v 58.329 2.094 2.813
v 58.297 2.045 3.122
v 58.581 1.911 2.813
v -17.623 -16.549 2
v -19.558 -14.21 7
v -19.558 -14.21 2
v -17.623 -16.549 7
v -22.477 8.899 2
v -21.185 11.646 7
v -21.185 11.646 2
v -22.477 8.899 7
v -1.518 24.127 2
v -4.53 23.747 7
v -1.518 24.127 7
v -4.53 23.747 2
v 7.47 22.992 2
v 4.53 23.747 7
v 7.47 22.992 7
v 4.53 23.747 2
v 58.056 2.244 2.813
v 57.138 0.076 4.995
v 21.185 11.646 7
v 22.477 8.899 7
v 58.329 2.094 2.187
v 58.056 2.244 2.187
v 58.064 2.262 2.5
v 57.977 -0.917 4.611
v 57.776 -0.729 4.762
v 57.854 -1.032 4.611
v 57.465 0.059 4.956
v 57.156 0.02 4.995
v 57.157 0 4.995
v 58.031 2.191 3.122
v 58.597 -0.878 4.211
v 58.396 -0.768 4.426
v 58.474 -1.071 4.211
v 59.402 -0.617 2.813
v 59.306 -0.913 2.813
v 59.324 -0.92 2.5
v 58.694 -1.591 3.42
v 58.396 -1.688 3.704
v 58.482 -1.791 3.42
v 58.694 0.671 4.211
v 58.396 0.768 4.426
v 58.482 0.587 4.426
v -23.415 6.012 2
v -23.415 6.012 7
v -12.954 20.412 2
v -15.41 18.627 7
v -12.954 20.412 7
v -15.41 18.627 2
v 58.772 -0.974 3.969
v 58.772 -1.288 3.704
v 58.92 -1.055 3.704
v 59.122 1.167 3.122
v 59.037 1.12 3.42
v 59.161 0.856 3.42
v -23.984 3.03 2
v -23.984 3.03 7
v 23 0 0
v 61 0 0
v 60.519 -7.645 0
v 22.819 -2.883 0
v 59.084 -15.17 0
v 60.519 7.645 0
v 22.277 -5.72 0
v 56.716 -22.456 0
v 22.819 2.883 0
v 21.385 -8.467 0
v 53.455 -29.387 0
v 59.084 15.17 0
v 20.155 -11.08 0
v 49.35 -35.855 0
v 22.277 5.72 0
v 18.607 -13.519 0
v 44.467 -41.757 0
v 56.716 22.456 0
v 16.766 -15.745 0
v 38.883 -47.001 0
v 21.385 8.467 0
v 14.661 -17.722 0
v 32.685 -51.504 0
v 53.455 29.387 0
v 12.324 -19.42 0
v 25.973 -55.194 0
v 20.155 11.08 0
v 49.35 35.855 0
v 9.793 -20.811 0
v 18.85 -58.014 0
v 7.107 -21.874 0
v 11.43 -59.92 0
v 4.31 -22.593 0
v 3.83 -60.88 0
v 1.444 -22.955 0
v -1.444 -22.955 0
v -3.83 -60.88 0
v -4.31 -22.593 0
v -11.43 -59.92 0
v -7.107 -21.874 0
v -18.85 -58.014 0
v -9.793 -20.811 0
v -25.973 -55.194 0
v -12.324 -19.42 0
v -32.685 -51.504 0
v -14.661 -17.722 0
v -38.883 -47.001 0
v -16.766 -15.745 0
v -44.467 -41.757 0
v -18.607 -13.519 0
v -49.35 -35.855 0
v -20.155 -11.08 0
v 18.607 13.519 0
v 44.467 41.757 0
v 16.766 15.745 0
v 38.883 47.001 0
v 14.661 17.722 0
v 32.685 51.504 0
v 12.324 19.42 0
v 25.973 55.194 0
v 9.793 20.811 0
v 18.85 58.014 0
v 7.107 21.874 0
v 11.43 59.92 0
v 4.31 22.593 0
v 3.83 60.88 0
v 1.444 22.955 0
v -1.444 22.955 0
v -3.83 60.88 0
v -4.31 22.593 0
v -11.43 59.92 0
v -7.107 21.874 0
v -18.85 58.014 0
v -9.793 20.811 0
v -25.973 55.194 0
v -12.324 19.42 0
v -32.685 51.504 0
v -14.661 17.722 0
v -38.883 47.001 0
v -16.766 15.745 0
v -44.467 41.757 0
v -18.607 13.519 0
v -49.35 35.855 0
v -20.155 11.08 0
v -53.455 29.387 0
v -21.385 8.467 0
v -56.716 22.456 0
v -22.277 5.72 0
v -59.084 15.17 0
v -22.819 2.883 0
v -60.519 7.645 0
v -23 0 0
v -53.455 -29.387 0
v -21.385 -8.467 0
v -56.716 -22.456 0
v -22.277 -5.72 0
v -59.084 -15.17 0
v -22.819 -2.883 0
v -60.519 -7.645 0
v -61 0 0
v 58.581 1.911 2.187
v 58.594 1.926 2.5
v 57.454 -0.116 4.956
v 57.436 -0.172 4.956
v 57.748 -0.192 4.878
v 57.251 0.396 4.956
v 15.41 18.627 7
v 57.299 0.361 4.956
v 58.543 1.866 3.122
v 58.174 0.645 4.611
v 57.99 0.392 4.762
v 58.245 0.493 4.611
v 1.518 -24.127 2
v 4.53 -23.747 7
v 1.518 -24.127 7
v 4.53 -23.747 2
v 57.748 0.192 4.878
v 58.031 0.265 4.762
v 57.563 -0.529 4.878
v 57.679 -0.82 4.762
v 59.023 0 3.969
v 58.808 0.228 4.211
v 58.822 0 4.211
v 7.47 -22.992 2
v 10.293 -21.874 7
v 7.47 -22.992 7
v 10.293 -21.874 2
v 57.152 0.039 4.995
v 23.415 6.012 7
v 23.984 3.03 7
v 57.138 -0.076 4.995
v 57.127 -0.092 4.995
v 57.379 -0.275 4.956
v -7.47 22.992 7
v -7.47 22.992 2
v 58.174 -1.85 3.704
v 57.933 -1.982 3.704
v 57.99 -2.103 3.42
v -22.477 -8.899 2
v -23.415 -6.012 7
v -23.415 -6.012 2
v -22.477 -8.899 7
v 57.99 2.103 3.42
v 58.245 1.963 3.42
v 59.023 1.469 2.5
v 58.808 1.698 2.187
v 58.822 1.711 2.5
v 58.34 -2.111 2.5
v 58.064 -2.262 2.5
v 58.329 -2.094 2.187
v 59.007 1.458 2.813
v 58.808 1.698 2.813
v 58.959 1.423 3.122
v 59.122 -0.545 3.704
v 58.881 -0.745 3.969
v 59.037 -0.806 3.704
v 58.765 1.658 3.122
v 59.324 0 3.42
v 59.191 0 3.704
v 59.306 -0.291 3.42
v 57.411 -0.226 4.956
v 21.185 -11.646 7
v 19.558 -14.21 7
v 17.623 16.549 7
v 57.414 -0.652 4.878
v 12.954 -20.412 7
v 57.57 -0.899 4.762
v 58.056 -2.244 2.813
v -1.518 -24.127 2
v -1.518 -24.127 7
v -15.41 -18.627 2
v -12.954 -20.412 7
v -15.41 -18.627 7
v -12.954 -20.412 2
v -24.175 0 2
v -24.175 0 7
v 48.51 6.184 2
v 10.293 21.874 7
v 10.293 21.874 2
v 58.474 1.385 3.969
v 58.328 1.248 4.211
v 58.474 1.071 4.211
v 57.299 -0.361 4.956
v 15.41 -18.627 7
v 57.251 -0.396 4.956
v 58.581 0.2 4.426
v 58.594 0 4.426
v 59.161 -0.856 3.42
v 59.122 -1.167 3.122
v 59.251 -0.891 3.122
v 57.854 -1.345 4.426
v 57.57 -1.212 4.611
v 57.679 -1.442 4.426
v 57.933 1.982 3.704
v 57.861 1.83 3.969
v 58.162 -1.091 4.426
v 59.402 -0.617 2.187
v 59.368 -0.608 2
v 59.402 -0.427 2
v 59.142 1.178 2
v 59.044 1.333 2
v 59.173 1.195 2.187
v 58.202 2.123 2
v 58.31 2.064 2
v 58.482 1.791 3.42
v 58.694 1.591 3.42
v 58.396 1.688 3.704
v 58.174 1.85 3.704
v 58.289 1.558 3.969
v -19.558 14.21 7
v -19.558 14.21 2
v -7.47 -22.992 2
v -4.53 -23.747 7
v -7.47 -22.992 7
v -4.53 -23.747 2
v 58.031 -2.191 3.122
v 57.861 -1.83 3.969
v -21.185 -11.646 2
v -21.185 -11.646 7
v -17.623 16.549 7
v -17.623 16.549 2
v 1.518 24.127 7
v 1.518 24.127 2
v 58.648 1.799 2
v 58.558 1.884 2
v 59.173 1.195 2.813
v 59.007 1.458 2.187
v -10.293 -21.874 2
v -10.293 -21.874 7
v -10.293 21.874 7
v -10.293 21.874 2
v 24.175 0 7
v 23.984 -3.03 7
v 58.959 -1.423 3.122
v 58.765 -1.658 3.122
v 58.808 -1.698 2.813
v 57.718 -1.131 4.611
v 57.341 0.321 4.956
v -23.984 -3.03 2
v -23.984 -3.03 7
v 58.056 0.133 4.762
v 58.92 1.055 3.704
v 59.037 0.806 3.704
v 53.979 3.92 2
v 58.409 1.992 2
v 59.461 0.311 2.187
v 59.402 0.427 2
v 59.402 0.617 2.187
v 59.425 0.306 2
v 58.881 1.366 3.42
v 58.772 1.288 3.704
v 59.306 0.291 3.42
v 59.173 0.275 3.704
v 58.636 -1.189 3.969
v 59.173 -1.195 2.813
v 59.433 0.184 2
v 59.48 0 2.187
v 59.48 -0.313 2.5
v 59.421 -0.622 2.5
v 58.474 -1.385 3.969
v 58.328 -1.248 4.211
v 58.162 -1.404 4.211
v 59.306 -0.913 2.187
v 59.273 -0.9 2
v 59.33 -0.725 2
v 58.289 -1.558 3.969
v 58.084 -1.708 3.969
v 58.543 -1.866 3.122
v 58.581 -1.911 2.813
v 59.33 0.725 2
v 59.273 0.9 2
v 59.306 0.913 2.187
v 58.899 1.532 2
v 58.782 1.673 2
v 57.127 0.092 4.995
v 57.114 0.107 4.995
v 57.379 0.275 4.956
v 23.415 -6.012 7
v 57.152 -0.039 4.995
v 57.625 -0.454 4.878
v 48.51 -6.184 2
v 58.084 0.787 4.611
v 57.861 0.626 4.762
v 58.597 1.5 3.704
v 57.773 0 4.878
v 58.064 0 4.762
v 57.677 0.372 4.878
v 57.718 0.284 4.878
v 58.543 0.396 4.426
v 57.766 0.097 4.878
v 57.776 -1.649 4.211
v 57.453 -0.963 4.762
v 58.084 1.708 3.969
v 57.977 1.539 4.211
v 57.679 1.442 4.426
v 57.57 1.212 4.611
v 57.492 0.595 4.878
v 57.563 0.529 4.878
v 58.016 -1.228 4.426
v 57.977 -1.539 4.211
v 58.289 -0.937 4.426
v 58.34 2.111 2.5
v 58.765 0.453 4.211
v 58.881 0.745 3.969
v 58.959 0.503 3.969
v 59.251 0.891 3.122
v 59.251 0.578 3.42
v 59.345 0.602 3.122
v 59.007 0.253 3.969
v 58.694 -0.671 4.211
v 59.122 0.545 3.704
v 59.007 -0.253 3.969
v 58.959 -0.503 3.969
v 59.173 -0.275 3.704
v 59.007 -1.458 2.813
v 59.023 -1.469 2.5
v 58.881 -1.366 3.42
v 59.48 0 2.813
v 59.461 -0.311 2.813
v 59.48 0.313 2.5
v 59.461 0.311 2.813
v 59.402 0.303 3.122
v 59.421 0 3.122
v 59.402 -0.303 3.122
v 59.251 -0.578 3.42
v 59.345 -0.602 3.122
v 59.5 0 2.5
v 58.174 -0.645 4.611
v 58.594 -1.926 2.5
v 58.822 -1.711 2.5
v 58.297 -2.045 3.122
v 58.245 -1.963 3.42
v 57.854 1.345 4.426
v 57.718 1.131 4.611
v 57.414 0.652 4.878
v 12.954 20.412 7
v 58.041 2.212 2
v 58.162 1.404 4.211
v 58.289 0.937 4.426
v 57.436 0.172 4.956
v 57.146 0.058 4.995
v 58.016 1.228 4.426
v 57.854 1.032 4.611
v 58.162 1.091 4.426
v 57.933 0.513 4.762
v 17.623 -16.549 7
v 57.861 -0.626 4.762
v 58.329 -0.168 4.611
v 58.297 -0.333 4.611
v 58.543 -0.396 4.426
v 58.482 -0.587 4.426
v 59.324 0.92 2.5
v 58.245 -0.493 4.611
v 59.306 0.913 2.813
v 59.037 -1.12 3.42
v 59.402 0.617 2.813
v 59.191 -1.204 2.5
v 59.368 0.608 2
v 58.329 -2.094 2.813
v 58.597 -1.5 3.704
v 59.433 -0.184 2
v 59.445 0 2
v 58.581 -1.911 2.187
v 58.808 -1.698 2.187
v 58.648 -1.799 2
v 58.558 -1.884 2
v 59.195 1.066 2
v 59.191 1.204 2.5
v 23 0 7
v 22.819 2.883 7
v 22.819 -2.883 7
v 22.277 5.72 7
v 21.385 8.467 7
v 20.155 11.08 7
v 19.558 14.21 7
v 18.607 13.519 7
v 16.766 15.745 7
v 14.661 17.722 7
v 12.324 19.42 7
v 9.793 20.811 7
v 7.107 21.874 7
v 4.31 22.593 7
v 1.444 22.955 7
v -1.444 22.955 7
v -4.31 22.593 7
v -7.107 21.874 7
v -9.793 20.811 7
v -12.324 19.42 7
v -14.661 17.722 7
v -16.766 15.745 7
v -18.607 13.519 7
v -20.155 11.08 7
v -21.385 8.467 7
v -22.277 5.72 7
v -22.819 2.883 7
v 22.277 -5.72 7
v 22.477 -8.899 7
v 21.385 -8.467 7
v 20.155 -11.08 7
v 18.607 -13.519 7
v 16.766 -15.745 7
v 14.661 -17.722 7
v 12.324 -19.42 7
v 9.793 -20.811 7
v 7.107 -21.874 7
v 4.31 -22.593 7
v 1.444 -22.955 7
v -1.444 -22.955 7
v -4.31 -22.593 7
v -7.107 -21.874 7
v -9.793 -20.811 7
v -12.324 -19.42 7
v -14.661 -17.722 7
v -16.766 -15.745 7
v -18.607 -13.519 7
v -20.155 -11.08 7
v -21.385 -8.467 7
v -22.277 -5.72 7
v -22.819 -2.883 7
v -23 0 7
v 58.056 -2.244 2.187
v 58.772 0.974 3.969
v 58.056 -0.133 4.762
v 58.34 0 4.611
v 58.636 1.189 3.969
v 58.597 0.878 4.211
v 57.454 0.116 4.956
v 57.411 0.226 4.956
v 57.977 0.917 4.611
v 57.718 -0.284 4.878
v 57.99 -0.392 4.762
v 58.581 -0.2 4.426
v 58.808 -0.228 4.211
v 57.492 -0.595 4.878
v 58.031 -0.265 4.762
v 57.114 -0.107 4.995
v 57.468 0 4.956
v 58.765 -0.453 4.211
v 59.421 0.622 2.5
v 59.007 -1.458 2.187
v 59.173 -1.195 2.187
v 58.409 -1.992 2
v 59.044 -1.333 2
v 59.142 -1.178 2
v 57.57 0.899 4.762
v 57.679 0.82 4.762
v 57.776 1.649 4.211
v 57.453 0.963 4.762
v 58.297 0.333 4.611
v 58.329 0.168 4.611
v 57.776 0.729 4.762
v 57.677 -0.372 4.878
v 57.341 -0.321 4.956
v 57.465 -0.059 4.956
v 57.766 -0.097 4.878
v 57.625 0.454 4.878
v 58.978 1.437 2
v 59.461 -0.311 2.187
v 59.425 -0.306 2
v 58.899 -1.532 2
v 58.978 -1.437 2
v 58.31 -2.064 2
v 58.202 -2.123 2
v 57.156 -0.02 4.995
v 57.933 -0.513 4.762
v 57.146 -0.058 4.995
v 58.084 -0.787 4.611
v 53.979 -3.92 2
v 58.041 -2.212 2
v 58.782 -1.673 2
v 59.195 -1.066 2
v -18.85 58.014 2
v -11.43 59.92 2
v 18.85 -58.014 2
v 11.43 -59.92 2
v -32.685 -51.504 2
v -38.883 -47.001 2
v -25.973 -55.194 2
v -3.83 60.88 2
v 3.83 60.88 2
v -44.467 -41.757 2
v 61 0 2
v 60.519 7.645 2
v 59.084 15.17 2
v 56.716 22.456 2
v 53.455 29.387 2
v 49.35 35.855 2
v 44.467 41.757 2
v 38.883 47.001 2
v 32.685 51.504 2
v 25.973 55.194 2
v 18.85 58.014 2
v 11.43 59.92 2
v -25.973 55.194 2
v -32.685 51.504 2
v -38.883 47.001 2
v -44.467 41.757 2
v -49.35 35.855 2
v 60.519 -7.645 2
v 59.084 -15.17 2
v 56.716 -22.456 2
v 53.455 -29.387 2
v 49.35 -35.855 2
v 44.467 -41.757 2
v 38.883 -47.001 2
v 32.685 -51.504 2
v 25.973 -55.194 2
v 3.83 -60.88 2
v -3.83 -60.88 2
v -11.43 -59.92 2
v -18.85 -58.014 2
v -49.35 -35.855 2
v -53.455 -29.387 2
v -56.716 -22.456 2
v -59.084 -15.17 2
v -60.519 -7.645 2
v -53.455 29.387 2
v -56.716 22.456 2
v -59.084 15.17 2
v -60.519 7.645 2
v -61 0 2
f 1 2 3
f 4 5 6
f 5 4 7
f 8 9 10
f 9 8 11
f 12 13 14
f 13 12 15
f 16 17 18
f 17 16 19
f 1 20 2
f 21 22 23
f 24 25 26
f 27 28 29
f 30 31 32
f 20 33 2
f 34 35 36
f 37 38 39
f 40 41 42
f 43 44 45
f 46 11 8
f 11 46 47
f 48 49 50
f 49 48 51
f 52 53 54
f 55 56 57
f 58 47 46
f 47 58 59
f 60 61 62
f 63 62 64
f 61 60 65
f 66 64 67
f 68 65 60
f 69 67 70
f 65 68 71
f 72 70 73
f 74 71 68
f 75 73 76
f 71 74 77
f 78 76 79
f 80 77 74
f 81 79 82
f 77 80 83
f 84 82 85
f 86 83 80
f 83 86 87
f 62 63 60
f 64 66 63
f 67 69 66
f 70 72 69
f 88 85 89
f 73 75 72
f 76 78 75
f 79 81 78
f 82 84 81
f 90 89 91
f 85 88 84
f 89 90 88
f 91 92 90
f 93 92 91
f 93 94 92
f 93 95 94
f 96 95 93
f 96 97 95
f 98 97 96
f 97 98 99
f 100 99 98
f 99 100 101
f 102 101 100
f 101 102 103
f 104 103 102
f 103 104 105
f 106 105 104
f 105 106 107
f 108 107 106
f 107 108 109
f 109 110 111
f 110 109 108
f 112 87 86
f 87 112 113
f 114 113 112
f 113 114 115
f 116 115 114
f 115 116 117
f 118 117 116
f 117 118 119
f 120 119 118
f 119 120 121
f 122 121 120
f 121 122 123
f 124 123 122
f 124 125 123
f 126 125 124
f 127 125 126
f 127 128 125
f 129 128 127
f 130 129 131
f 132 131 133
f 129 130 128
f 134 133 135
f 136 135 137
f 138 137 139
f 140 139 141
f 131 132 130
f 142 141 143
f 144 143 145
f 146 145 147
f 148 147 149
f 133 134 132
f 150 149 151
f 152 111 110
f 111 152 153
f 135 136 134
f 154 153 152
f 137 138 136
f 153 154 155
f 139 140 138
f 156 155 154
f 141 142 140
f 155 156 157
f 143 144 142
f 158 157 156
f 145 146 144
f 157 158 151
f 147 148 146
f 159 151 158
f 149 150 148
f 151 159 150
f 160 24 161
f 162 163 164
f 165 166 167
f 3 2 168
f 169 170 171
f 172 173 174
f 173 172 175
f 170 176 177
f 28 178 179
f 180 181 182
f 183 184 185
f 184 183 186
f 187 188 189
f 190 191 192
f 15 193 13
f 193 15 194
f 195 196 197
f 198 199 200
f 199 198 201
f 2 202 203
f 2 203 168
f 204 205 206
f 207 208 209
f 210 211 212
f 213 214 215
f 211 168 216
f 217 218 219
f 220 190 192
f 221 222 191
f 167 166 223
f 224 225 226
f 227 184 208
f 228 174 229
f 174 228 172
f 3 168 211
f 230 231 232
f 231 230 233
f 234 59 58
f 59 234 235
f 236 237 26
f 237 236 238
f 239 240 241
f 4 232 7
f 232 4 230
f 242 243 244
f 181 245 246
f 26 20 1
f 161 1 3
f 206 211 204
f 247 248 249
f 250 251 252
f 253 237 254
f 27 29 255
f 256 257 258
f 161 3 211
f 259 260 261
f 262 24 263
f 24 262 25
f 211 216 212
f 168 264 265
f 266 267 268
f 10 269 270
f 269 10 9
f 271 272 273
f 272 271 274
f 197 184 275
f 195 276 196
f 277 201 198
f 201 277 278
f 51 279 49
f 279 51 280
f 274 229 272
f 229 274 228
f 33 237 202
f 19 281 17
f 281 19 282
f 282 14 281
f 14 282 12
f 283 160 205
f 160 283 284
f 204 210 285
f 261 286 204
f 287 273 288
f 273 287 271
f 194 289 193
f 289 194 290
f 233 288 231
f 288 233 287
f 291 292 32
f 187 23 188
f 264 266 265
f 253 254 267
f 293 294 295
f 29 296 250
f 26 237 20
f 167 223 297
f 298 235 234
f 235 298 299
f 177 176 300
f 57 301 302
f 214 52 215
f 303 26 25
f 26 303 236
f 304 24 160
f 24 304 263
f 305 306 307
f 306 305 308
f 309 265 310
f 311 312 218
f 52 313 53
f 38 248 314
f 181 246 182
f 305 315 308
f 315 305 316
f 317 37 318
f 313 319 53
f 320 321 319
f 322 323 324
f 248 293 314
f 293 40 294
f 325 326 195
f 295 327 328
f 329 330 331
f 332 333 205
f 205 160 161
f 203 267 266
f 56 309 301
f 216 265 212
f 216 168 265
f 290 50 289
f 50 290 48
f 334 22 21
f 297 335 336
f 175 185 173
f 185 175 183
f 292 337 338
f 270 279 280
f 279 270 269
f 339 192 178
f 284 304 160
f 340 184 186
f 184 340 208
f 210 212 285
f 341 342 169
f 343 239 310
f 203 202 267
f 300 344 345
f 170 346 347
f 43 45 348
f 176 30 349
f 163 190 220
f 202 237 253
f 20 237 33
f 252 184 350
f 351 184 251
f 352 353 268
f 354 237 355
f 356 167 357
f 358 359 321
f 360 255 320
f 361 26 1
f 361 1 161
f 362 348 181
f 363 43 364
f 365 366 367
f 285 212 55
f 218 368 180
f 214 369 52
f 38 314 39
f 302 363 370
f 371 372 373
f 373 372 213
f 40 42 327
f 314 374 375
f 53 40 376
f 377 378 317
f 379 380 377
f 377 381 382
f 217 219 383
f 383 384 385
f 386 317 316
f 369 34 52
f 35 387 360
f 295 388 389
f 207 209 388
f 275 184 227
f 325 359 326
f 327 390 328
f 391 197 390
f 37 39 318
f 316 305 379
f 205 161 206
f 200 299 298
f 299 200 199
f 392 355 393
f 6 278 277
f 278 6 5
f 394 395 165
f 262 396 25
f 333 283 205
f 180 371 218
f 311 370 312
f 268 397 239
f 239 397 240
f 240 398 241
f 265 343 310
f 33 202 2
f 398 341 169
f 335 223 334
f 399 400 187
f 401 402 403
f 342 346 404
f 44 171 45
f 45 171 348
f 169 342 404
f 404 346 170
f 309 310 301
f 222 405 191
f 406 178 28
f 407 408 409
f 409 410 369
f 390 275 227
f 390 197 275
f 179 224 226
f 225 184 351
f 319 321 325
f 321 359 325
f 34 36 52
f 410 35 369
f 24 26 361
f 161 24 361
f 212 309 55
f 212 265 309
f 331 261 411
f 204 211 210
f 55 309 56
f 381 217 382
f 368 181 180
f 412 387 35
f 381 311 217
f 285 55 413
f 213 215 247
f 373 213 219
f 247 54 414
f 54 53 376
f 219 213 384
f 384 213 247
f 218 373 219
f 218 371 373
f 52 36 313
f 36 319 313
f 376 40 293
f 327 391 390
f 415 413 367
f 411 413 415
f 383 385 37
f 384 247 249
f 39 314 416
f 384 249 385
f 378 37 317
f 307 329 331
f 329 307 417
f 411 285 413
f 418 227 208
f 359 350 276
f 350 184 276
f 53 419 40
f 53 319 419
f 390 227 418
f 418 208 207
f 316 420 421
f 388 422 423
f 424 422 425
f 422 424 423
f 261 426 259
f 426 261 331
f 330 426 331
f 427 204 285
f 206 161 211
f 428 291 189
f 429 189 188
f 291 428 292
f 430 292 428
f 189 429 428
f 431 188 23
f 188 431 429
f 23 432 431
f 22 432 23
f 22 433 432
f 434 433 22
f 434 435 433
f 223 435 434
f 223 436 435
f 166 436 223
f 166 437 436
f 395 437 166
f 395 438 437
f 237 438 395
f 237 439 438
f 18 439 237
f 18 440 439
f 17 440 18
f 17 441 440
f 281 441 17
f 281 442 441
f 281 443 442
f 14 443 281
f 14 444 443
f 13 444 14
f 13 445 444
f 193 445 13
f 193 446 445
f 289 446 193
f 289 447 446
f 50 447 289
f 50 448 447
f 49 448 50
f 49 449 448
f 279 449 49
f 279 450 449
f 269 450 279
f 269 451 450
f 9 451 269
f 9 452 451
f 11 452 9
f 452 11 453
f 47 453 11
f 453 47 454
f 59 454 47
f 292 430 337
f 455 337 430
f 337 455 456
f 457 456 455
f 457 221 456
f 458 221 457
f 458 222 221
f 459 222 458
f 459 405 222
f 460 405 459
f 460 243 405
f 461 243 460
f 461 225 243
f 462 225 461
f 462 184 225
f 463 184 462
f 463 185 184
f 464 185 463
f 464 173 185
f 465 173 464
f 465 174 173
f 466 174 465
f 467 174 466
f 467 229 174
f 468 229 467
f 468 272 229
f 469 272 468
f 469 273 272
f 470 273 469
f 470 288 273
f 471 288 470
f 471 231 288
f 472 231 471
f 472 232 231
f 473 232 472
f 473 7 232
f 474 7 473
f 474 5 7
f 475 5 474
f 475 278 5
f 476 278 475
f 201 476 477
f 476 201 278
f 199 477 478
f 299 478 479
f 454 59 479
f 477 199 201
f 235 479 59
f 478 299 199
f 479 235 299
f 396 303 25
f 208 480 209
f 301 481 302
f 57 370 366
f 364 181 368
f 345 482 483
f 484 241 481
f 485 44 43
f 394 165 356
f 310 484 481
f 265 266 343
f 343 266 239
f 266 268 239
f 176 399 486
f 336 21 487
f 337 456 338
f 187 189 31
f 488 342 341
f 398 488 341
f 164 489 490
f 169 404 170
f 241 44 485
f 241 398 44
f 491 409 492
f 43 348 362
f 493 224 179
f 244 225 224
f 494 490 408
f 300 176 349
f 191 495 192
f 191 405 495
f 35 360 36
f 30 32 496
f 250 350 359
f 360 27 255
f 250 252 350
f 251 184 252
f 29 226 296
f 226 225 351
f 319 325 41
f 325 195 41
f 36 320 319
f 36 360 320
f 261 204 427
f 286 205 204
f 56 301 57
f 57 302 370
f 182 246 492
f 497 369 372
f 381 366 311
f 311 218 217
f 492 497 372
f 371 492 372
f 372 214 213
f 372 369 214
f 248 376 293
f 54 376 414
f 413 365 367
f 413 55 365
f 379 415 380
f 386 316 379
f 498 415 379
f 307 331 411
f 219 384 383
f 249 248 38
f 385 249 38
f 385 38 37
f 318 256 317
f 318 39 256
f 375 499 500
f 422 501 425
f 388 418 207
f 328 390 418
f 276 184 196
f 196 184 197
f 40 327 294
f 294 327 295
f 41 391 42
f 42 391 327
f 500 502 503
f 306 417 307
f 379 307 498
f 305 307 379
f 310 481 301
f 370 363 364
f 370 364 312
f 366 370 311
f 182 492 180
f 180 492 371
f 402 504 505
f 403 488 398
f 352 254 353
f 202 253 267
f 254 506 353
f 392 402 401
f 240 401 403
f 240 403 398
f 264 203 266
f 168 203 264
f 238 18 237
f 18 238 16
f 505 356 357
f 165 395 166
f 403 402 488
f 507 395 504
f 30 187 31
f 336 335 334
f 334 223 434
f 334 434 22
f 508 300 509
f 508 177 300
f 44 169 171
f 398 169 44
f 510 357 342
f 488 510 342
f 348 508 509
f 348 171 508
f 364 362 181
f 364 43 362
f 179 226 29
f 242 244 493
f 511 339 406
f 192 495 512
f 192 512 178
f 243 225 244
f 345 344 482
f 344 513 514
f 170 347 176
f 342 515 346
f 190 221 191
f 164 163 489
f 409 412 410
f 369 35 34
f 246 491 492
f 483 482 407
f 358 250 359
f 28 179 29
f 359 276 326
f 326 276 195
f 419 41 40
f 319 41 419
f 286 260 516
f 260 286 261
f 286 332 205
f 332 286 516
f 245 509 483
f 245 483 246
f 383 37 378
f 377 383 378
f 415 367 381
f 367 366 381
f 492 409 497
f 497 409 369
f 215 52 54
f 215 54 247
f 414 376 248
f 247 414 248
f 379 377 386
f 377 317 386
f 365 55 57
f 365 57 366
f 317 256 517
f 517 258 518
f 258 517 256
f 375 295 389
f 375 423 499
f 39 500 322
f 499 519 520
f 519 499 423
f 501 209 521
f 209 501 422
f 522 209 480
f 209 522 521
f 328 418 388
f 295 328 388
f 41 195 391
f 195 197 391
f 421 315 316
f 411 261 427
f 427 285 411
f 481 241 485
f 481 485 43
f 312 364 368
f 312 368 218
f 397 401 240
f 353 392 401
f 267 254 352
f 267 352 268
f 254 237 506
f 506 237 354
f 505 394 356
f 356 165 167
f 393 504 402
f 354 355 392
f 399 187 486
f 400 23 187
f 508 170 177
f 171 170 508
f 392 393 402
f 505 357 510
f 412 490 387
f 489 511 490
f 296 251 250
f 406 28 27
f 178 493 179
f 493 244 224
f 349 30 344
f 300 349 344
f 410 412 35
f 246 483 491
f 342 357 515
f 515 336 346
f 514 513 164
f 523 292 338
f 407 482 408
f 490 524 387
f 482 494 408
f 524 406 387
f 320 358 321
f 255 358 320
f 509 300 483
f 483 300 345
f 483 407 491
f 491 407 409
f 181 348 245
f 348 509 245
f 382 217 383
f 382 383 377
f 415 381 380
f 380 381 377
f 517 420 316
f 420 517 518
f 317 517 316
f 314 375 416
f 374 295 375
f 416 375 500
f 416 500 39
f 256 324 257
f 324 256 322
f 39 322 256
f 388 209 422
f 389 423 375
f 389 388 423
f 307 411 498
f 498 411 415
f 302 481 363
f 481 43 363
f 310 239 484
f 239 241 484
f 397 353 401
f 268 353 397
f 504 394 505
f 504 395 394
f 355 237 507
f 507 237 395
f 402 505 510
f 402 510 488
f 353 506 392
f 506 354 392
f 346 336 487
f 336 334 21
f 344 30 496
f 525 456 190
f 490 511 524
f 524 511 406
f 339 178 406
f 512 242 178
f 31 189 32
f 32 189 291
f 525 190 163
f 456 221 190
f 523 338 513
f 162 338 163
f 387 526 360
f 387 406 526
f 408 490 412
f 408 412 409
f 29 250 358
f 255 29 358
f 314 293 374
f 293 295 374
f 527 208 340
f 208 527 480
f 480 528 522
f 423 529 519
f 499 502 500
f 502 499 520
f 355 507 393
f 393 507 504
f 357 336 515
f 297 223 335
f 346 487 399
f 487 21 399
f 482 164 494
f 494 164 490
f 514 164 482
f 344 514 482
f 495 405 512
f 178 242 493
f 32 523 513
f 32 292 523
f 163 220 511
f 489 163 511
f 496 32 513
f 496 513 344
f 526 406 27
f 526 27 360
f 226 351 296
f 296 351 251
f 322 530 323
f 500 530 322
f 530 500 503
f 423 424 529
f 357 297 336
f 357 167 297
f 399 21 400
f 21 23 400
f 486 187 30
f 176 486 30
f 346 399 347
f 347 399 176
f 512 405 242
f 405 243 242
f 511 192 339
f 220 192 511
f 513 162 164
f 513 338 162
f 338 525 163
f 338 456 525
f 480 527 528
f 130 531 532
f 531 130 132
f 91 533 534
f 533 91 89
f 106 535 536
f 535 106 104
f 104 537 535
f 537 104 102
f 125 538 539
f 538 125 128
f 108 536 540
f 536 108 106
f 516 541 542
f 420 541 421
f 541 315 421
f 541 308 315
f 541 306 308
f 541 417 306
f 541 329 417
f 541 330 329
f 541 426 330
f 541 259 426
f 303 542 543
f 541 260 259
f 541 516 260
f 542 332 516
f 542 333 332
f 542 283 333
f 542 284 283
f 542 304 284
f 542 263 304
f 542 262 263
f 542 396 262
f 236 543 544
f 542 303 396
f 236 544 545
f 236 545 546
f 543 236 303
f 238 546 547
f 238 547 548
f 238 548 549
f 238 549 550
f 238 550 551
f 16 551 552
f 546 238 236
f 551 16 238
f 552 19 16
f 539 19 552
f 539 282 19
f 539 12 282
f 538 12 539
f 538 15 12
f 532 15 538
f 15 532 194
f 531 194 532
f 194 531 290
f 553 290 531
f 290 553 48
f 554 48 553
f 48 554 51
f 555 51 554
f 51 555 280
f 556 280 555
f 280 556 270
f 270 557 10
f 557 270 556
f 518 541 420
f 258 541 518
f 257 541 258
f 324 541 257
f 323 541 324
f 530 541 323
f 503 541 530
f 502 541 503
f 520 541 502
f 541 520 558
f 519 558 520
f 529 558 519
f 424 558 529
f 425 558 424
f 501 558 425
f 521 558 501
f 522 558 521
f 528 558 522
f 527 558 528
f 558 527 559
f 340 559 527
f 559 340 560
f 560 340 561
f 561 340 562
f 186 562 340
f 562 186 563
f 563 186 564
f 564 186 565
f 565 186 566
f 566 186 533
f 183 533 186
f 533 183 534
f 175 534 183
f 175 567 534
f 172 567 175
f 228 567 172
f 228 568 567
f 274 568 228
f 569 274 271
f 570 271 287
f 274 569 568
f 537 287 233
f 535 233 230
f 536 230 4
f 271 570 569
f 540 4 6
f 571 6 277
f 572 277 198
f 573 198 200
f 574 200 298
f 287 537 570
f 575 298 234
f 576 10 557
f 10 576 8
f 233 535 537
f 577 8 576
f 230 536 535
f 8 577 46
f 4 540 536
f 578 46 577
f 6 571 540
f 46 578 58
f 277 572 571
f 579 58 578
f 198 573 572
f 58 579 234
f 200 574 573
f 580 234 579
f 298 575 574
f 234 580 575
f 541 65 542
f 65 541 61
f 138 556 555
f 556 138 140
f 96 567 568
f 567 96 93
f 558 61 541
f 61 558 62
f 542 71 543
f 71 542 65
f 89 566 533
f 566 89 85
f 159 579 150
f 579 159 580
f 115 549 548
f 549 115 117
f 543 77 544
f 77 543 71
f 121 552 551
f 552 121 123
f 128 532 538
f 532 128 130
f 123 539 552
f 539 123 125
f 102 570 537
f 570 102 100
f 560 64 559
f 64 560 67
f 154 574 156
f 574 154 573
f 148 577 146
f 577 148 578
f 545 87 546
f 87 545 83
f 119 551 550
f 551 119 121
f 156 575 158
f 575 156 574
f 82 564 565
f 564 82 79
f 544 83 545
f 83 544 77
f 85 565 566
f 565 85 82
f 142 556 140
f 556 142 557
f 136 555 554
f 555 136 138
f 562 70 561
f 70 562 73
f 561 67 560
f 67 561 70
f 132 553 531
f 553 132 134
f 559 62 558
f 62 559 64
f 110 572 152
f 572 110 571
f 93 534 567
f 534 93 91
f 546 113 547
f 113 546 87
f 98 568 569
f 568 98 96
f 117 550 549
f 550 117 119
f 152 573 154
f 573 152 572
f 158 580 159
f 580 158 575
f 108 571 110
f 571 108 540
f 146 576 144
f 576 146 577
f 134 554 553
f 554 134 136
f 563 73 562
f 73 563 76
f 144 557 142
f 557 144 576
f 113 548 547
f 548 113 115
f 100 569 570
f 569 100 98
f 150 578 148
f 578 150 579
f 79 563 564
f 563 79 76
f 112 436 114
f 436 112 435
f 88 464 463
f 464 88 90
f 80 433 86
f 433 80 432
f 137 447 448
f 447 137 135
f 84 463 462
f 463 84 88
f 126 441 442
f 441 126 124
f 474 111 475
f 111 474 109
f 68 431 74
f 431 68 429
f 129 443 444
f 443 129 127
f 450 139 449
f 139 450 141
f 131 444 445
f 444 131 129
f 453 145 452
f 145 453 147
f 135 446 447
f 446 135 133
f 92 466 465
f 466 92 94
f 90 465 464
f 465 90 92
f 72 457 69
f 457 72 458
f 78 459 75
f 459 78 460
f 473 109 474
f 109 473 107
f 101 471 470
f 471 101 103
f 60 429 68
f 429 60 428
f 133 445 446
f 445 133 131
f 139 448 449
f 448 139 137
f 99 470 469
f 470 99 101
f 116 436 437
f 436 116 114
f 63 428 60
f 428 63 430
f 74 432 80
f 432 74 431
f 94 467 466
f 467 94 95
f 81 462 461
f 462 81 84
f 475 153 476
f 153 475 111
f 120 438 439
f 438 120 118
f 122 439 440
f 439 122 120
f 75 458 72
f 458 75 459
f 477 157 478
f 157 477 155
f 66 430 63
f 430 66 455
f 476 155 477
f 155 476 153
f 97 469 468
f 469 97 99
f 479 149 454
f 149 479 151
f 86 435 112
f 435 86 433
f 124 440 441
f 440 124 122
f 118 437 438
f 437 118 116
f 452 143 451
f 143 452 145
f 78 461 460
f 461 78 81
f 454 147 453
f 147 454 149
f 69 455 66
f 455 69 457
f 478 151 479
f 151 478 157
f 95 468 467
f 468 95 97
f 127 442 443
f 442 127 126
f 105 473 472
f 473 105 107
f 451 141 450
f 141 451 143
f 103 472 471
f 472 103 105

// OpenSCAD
$fn=50;

difference()
{
	union()
	{
		hull()
		{
			cylinder(h=7, d=48 + 0.35);
			translate([57,0,2.5]) sphere(d=5);
		}
		cylinder(h=2, d=122);
	}
	cylinder(h=7, d=46);
	translate([0,0,-0.01]) cylinder(h=7 + 0.02, d=44 + 0.35);
}
